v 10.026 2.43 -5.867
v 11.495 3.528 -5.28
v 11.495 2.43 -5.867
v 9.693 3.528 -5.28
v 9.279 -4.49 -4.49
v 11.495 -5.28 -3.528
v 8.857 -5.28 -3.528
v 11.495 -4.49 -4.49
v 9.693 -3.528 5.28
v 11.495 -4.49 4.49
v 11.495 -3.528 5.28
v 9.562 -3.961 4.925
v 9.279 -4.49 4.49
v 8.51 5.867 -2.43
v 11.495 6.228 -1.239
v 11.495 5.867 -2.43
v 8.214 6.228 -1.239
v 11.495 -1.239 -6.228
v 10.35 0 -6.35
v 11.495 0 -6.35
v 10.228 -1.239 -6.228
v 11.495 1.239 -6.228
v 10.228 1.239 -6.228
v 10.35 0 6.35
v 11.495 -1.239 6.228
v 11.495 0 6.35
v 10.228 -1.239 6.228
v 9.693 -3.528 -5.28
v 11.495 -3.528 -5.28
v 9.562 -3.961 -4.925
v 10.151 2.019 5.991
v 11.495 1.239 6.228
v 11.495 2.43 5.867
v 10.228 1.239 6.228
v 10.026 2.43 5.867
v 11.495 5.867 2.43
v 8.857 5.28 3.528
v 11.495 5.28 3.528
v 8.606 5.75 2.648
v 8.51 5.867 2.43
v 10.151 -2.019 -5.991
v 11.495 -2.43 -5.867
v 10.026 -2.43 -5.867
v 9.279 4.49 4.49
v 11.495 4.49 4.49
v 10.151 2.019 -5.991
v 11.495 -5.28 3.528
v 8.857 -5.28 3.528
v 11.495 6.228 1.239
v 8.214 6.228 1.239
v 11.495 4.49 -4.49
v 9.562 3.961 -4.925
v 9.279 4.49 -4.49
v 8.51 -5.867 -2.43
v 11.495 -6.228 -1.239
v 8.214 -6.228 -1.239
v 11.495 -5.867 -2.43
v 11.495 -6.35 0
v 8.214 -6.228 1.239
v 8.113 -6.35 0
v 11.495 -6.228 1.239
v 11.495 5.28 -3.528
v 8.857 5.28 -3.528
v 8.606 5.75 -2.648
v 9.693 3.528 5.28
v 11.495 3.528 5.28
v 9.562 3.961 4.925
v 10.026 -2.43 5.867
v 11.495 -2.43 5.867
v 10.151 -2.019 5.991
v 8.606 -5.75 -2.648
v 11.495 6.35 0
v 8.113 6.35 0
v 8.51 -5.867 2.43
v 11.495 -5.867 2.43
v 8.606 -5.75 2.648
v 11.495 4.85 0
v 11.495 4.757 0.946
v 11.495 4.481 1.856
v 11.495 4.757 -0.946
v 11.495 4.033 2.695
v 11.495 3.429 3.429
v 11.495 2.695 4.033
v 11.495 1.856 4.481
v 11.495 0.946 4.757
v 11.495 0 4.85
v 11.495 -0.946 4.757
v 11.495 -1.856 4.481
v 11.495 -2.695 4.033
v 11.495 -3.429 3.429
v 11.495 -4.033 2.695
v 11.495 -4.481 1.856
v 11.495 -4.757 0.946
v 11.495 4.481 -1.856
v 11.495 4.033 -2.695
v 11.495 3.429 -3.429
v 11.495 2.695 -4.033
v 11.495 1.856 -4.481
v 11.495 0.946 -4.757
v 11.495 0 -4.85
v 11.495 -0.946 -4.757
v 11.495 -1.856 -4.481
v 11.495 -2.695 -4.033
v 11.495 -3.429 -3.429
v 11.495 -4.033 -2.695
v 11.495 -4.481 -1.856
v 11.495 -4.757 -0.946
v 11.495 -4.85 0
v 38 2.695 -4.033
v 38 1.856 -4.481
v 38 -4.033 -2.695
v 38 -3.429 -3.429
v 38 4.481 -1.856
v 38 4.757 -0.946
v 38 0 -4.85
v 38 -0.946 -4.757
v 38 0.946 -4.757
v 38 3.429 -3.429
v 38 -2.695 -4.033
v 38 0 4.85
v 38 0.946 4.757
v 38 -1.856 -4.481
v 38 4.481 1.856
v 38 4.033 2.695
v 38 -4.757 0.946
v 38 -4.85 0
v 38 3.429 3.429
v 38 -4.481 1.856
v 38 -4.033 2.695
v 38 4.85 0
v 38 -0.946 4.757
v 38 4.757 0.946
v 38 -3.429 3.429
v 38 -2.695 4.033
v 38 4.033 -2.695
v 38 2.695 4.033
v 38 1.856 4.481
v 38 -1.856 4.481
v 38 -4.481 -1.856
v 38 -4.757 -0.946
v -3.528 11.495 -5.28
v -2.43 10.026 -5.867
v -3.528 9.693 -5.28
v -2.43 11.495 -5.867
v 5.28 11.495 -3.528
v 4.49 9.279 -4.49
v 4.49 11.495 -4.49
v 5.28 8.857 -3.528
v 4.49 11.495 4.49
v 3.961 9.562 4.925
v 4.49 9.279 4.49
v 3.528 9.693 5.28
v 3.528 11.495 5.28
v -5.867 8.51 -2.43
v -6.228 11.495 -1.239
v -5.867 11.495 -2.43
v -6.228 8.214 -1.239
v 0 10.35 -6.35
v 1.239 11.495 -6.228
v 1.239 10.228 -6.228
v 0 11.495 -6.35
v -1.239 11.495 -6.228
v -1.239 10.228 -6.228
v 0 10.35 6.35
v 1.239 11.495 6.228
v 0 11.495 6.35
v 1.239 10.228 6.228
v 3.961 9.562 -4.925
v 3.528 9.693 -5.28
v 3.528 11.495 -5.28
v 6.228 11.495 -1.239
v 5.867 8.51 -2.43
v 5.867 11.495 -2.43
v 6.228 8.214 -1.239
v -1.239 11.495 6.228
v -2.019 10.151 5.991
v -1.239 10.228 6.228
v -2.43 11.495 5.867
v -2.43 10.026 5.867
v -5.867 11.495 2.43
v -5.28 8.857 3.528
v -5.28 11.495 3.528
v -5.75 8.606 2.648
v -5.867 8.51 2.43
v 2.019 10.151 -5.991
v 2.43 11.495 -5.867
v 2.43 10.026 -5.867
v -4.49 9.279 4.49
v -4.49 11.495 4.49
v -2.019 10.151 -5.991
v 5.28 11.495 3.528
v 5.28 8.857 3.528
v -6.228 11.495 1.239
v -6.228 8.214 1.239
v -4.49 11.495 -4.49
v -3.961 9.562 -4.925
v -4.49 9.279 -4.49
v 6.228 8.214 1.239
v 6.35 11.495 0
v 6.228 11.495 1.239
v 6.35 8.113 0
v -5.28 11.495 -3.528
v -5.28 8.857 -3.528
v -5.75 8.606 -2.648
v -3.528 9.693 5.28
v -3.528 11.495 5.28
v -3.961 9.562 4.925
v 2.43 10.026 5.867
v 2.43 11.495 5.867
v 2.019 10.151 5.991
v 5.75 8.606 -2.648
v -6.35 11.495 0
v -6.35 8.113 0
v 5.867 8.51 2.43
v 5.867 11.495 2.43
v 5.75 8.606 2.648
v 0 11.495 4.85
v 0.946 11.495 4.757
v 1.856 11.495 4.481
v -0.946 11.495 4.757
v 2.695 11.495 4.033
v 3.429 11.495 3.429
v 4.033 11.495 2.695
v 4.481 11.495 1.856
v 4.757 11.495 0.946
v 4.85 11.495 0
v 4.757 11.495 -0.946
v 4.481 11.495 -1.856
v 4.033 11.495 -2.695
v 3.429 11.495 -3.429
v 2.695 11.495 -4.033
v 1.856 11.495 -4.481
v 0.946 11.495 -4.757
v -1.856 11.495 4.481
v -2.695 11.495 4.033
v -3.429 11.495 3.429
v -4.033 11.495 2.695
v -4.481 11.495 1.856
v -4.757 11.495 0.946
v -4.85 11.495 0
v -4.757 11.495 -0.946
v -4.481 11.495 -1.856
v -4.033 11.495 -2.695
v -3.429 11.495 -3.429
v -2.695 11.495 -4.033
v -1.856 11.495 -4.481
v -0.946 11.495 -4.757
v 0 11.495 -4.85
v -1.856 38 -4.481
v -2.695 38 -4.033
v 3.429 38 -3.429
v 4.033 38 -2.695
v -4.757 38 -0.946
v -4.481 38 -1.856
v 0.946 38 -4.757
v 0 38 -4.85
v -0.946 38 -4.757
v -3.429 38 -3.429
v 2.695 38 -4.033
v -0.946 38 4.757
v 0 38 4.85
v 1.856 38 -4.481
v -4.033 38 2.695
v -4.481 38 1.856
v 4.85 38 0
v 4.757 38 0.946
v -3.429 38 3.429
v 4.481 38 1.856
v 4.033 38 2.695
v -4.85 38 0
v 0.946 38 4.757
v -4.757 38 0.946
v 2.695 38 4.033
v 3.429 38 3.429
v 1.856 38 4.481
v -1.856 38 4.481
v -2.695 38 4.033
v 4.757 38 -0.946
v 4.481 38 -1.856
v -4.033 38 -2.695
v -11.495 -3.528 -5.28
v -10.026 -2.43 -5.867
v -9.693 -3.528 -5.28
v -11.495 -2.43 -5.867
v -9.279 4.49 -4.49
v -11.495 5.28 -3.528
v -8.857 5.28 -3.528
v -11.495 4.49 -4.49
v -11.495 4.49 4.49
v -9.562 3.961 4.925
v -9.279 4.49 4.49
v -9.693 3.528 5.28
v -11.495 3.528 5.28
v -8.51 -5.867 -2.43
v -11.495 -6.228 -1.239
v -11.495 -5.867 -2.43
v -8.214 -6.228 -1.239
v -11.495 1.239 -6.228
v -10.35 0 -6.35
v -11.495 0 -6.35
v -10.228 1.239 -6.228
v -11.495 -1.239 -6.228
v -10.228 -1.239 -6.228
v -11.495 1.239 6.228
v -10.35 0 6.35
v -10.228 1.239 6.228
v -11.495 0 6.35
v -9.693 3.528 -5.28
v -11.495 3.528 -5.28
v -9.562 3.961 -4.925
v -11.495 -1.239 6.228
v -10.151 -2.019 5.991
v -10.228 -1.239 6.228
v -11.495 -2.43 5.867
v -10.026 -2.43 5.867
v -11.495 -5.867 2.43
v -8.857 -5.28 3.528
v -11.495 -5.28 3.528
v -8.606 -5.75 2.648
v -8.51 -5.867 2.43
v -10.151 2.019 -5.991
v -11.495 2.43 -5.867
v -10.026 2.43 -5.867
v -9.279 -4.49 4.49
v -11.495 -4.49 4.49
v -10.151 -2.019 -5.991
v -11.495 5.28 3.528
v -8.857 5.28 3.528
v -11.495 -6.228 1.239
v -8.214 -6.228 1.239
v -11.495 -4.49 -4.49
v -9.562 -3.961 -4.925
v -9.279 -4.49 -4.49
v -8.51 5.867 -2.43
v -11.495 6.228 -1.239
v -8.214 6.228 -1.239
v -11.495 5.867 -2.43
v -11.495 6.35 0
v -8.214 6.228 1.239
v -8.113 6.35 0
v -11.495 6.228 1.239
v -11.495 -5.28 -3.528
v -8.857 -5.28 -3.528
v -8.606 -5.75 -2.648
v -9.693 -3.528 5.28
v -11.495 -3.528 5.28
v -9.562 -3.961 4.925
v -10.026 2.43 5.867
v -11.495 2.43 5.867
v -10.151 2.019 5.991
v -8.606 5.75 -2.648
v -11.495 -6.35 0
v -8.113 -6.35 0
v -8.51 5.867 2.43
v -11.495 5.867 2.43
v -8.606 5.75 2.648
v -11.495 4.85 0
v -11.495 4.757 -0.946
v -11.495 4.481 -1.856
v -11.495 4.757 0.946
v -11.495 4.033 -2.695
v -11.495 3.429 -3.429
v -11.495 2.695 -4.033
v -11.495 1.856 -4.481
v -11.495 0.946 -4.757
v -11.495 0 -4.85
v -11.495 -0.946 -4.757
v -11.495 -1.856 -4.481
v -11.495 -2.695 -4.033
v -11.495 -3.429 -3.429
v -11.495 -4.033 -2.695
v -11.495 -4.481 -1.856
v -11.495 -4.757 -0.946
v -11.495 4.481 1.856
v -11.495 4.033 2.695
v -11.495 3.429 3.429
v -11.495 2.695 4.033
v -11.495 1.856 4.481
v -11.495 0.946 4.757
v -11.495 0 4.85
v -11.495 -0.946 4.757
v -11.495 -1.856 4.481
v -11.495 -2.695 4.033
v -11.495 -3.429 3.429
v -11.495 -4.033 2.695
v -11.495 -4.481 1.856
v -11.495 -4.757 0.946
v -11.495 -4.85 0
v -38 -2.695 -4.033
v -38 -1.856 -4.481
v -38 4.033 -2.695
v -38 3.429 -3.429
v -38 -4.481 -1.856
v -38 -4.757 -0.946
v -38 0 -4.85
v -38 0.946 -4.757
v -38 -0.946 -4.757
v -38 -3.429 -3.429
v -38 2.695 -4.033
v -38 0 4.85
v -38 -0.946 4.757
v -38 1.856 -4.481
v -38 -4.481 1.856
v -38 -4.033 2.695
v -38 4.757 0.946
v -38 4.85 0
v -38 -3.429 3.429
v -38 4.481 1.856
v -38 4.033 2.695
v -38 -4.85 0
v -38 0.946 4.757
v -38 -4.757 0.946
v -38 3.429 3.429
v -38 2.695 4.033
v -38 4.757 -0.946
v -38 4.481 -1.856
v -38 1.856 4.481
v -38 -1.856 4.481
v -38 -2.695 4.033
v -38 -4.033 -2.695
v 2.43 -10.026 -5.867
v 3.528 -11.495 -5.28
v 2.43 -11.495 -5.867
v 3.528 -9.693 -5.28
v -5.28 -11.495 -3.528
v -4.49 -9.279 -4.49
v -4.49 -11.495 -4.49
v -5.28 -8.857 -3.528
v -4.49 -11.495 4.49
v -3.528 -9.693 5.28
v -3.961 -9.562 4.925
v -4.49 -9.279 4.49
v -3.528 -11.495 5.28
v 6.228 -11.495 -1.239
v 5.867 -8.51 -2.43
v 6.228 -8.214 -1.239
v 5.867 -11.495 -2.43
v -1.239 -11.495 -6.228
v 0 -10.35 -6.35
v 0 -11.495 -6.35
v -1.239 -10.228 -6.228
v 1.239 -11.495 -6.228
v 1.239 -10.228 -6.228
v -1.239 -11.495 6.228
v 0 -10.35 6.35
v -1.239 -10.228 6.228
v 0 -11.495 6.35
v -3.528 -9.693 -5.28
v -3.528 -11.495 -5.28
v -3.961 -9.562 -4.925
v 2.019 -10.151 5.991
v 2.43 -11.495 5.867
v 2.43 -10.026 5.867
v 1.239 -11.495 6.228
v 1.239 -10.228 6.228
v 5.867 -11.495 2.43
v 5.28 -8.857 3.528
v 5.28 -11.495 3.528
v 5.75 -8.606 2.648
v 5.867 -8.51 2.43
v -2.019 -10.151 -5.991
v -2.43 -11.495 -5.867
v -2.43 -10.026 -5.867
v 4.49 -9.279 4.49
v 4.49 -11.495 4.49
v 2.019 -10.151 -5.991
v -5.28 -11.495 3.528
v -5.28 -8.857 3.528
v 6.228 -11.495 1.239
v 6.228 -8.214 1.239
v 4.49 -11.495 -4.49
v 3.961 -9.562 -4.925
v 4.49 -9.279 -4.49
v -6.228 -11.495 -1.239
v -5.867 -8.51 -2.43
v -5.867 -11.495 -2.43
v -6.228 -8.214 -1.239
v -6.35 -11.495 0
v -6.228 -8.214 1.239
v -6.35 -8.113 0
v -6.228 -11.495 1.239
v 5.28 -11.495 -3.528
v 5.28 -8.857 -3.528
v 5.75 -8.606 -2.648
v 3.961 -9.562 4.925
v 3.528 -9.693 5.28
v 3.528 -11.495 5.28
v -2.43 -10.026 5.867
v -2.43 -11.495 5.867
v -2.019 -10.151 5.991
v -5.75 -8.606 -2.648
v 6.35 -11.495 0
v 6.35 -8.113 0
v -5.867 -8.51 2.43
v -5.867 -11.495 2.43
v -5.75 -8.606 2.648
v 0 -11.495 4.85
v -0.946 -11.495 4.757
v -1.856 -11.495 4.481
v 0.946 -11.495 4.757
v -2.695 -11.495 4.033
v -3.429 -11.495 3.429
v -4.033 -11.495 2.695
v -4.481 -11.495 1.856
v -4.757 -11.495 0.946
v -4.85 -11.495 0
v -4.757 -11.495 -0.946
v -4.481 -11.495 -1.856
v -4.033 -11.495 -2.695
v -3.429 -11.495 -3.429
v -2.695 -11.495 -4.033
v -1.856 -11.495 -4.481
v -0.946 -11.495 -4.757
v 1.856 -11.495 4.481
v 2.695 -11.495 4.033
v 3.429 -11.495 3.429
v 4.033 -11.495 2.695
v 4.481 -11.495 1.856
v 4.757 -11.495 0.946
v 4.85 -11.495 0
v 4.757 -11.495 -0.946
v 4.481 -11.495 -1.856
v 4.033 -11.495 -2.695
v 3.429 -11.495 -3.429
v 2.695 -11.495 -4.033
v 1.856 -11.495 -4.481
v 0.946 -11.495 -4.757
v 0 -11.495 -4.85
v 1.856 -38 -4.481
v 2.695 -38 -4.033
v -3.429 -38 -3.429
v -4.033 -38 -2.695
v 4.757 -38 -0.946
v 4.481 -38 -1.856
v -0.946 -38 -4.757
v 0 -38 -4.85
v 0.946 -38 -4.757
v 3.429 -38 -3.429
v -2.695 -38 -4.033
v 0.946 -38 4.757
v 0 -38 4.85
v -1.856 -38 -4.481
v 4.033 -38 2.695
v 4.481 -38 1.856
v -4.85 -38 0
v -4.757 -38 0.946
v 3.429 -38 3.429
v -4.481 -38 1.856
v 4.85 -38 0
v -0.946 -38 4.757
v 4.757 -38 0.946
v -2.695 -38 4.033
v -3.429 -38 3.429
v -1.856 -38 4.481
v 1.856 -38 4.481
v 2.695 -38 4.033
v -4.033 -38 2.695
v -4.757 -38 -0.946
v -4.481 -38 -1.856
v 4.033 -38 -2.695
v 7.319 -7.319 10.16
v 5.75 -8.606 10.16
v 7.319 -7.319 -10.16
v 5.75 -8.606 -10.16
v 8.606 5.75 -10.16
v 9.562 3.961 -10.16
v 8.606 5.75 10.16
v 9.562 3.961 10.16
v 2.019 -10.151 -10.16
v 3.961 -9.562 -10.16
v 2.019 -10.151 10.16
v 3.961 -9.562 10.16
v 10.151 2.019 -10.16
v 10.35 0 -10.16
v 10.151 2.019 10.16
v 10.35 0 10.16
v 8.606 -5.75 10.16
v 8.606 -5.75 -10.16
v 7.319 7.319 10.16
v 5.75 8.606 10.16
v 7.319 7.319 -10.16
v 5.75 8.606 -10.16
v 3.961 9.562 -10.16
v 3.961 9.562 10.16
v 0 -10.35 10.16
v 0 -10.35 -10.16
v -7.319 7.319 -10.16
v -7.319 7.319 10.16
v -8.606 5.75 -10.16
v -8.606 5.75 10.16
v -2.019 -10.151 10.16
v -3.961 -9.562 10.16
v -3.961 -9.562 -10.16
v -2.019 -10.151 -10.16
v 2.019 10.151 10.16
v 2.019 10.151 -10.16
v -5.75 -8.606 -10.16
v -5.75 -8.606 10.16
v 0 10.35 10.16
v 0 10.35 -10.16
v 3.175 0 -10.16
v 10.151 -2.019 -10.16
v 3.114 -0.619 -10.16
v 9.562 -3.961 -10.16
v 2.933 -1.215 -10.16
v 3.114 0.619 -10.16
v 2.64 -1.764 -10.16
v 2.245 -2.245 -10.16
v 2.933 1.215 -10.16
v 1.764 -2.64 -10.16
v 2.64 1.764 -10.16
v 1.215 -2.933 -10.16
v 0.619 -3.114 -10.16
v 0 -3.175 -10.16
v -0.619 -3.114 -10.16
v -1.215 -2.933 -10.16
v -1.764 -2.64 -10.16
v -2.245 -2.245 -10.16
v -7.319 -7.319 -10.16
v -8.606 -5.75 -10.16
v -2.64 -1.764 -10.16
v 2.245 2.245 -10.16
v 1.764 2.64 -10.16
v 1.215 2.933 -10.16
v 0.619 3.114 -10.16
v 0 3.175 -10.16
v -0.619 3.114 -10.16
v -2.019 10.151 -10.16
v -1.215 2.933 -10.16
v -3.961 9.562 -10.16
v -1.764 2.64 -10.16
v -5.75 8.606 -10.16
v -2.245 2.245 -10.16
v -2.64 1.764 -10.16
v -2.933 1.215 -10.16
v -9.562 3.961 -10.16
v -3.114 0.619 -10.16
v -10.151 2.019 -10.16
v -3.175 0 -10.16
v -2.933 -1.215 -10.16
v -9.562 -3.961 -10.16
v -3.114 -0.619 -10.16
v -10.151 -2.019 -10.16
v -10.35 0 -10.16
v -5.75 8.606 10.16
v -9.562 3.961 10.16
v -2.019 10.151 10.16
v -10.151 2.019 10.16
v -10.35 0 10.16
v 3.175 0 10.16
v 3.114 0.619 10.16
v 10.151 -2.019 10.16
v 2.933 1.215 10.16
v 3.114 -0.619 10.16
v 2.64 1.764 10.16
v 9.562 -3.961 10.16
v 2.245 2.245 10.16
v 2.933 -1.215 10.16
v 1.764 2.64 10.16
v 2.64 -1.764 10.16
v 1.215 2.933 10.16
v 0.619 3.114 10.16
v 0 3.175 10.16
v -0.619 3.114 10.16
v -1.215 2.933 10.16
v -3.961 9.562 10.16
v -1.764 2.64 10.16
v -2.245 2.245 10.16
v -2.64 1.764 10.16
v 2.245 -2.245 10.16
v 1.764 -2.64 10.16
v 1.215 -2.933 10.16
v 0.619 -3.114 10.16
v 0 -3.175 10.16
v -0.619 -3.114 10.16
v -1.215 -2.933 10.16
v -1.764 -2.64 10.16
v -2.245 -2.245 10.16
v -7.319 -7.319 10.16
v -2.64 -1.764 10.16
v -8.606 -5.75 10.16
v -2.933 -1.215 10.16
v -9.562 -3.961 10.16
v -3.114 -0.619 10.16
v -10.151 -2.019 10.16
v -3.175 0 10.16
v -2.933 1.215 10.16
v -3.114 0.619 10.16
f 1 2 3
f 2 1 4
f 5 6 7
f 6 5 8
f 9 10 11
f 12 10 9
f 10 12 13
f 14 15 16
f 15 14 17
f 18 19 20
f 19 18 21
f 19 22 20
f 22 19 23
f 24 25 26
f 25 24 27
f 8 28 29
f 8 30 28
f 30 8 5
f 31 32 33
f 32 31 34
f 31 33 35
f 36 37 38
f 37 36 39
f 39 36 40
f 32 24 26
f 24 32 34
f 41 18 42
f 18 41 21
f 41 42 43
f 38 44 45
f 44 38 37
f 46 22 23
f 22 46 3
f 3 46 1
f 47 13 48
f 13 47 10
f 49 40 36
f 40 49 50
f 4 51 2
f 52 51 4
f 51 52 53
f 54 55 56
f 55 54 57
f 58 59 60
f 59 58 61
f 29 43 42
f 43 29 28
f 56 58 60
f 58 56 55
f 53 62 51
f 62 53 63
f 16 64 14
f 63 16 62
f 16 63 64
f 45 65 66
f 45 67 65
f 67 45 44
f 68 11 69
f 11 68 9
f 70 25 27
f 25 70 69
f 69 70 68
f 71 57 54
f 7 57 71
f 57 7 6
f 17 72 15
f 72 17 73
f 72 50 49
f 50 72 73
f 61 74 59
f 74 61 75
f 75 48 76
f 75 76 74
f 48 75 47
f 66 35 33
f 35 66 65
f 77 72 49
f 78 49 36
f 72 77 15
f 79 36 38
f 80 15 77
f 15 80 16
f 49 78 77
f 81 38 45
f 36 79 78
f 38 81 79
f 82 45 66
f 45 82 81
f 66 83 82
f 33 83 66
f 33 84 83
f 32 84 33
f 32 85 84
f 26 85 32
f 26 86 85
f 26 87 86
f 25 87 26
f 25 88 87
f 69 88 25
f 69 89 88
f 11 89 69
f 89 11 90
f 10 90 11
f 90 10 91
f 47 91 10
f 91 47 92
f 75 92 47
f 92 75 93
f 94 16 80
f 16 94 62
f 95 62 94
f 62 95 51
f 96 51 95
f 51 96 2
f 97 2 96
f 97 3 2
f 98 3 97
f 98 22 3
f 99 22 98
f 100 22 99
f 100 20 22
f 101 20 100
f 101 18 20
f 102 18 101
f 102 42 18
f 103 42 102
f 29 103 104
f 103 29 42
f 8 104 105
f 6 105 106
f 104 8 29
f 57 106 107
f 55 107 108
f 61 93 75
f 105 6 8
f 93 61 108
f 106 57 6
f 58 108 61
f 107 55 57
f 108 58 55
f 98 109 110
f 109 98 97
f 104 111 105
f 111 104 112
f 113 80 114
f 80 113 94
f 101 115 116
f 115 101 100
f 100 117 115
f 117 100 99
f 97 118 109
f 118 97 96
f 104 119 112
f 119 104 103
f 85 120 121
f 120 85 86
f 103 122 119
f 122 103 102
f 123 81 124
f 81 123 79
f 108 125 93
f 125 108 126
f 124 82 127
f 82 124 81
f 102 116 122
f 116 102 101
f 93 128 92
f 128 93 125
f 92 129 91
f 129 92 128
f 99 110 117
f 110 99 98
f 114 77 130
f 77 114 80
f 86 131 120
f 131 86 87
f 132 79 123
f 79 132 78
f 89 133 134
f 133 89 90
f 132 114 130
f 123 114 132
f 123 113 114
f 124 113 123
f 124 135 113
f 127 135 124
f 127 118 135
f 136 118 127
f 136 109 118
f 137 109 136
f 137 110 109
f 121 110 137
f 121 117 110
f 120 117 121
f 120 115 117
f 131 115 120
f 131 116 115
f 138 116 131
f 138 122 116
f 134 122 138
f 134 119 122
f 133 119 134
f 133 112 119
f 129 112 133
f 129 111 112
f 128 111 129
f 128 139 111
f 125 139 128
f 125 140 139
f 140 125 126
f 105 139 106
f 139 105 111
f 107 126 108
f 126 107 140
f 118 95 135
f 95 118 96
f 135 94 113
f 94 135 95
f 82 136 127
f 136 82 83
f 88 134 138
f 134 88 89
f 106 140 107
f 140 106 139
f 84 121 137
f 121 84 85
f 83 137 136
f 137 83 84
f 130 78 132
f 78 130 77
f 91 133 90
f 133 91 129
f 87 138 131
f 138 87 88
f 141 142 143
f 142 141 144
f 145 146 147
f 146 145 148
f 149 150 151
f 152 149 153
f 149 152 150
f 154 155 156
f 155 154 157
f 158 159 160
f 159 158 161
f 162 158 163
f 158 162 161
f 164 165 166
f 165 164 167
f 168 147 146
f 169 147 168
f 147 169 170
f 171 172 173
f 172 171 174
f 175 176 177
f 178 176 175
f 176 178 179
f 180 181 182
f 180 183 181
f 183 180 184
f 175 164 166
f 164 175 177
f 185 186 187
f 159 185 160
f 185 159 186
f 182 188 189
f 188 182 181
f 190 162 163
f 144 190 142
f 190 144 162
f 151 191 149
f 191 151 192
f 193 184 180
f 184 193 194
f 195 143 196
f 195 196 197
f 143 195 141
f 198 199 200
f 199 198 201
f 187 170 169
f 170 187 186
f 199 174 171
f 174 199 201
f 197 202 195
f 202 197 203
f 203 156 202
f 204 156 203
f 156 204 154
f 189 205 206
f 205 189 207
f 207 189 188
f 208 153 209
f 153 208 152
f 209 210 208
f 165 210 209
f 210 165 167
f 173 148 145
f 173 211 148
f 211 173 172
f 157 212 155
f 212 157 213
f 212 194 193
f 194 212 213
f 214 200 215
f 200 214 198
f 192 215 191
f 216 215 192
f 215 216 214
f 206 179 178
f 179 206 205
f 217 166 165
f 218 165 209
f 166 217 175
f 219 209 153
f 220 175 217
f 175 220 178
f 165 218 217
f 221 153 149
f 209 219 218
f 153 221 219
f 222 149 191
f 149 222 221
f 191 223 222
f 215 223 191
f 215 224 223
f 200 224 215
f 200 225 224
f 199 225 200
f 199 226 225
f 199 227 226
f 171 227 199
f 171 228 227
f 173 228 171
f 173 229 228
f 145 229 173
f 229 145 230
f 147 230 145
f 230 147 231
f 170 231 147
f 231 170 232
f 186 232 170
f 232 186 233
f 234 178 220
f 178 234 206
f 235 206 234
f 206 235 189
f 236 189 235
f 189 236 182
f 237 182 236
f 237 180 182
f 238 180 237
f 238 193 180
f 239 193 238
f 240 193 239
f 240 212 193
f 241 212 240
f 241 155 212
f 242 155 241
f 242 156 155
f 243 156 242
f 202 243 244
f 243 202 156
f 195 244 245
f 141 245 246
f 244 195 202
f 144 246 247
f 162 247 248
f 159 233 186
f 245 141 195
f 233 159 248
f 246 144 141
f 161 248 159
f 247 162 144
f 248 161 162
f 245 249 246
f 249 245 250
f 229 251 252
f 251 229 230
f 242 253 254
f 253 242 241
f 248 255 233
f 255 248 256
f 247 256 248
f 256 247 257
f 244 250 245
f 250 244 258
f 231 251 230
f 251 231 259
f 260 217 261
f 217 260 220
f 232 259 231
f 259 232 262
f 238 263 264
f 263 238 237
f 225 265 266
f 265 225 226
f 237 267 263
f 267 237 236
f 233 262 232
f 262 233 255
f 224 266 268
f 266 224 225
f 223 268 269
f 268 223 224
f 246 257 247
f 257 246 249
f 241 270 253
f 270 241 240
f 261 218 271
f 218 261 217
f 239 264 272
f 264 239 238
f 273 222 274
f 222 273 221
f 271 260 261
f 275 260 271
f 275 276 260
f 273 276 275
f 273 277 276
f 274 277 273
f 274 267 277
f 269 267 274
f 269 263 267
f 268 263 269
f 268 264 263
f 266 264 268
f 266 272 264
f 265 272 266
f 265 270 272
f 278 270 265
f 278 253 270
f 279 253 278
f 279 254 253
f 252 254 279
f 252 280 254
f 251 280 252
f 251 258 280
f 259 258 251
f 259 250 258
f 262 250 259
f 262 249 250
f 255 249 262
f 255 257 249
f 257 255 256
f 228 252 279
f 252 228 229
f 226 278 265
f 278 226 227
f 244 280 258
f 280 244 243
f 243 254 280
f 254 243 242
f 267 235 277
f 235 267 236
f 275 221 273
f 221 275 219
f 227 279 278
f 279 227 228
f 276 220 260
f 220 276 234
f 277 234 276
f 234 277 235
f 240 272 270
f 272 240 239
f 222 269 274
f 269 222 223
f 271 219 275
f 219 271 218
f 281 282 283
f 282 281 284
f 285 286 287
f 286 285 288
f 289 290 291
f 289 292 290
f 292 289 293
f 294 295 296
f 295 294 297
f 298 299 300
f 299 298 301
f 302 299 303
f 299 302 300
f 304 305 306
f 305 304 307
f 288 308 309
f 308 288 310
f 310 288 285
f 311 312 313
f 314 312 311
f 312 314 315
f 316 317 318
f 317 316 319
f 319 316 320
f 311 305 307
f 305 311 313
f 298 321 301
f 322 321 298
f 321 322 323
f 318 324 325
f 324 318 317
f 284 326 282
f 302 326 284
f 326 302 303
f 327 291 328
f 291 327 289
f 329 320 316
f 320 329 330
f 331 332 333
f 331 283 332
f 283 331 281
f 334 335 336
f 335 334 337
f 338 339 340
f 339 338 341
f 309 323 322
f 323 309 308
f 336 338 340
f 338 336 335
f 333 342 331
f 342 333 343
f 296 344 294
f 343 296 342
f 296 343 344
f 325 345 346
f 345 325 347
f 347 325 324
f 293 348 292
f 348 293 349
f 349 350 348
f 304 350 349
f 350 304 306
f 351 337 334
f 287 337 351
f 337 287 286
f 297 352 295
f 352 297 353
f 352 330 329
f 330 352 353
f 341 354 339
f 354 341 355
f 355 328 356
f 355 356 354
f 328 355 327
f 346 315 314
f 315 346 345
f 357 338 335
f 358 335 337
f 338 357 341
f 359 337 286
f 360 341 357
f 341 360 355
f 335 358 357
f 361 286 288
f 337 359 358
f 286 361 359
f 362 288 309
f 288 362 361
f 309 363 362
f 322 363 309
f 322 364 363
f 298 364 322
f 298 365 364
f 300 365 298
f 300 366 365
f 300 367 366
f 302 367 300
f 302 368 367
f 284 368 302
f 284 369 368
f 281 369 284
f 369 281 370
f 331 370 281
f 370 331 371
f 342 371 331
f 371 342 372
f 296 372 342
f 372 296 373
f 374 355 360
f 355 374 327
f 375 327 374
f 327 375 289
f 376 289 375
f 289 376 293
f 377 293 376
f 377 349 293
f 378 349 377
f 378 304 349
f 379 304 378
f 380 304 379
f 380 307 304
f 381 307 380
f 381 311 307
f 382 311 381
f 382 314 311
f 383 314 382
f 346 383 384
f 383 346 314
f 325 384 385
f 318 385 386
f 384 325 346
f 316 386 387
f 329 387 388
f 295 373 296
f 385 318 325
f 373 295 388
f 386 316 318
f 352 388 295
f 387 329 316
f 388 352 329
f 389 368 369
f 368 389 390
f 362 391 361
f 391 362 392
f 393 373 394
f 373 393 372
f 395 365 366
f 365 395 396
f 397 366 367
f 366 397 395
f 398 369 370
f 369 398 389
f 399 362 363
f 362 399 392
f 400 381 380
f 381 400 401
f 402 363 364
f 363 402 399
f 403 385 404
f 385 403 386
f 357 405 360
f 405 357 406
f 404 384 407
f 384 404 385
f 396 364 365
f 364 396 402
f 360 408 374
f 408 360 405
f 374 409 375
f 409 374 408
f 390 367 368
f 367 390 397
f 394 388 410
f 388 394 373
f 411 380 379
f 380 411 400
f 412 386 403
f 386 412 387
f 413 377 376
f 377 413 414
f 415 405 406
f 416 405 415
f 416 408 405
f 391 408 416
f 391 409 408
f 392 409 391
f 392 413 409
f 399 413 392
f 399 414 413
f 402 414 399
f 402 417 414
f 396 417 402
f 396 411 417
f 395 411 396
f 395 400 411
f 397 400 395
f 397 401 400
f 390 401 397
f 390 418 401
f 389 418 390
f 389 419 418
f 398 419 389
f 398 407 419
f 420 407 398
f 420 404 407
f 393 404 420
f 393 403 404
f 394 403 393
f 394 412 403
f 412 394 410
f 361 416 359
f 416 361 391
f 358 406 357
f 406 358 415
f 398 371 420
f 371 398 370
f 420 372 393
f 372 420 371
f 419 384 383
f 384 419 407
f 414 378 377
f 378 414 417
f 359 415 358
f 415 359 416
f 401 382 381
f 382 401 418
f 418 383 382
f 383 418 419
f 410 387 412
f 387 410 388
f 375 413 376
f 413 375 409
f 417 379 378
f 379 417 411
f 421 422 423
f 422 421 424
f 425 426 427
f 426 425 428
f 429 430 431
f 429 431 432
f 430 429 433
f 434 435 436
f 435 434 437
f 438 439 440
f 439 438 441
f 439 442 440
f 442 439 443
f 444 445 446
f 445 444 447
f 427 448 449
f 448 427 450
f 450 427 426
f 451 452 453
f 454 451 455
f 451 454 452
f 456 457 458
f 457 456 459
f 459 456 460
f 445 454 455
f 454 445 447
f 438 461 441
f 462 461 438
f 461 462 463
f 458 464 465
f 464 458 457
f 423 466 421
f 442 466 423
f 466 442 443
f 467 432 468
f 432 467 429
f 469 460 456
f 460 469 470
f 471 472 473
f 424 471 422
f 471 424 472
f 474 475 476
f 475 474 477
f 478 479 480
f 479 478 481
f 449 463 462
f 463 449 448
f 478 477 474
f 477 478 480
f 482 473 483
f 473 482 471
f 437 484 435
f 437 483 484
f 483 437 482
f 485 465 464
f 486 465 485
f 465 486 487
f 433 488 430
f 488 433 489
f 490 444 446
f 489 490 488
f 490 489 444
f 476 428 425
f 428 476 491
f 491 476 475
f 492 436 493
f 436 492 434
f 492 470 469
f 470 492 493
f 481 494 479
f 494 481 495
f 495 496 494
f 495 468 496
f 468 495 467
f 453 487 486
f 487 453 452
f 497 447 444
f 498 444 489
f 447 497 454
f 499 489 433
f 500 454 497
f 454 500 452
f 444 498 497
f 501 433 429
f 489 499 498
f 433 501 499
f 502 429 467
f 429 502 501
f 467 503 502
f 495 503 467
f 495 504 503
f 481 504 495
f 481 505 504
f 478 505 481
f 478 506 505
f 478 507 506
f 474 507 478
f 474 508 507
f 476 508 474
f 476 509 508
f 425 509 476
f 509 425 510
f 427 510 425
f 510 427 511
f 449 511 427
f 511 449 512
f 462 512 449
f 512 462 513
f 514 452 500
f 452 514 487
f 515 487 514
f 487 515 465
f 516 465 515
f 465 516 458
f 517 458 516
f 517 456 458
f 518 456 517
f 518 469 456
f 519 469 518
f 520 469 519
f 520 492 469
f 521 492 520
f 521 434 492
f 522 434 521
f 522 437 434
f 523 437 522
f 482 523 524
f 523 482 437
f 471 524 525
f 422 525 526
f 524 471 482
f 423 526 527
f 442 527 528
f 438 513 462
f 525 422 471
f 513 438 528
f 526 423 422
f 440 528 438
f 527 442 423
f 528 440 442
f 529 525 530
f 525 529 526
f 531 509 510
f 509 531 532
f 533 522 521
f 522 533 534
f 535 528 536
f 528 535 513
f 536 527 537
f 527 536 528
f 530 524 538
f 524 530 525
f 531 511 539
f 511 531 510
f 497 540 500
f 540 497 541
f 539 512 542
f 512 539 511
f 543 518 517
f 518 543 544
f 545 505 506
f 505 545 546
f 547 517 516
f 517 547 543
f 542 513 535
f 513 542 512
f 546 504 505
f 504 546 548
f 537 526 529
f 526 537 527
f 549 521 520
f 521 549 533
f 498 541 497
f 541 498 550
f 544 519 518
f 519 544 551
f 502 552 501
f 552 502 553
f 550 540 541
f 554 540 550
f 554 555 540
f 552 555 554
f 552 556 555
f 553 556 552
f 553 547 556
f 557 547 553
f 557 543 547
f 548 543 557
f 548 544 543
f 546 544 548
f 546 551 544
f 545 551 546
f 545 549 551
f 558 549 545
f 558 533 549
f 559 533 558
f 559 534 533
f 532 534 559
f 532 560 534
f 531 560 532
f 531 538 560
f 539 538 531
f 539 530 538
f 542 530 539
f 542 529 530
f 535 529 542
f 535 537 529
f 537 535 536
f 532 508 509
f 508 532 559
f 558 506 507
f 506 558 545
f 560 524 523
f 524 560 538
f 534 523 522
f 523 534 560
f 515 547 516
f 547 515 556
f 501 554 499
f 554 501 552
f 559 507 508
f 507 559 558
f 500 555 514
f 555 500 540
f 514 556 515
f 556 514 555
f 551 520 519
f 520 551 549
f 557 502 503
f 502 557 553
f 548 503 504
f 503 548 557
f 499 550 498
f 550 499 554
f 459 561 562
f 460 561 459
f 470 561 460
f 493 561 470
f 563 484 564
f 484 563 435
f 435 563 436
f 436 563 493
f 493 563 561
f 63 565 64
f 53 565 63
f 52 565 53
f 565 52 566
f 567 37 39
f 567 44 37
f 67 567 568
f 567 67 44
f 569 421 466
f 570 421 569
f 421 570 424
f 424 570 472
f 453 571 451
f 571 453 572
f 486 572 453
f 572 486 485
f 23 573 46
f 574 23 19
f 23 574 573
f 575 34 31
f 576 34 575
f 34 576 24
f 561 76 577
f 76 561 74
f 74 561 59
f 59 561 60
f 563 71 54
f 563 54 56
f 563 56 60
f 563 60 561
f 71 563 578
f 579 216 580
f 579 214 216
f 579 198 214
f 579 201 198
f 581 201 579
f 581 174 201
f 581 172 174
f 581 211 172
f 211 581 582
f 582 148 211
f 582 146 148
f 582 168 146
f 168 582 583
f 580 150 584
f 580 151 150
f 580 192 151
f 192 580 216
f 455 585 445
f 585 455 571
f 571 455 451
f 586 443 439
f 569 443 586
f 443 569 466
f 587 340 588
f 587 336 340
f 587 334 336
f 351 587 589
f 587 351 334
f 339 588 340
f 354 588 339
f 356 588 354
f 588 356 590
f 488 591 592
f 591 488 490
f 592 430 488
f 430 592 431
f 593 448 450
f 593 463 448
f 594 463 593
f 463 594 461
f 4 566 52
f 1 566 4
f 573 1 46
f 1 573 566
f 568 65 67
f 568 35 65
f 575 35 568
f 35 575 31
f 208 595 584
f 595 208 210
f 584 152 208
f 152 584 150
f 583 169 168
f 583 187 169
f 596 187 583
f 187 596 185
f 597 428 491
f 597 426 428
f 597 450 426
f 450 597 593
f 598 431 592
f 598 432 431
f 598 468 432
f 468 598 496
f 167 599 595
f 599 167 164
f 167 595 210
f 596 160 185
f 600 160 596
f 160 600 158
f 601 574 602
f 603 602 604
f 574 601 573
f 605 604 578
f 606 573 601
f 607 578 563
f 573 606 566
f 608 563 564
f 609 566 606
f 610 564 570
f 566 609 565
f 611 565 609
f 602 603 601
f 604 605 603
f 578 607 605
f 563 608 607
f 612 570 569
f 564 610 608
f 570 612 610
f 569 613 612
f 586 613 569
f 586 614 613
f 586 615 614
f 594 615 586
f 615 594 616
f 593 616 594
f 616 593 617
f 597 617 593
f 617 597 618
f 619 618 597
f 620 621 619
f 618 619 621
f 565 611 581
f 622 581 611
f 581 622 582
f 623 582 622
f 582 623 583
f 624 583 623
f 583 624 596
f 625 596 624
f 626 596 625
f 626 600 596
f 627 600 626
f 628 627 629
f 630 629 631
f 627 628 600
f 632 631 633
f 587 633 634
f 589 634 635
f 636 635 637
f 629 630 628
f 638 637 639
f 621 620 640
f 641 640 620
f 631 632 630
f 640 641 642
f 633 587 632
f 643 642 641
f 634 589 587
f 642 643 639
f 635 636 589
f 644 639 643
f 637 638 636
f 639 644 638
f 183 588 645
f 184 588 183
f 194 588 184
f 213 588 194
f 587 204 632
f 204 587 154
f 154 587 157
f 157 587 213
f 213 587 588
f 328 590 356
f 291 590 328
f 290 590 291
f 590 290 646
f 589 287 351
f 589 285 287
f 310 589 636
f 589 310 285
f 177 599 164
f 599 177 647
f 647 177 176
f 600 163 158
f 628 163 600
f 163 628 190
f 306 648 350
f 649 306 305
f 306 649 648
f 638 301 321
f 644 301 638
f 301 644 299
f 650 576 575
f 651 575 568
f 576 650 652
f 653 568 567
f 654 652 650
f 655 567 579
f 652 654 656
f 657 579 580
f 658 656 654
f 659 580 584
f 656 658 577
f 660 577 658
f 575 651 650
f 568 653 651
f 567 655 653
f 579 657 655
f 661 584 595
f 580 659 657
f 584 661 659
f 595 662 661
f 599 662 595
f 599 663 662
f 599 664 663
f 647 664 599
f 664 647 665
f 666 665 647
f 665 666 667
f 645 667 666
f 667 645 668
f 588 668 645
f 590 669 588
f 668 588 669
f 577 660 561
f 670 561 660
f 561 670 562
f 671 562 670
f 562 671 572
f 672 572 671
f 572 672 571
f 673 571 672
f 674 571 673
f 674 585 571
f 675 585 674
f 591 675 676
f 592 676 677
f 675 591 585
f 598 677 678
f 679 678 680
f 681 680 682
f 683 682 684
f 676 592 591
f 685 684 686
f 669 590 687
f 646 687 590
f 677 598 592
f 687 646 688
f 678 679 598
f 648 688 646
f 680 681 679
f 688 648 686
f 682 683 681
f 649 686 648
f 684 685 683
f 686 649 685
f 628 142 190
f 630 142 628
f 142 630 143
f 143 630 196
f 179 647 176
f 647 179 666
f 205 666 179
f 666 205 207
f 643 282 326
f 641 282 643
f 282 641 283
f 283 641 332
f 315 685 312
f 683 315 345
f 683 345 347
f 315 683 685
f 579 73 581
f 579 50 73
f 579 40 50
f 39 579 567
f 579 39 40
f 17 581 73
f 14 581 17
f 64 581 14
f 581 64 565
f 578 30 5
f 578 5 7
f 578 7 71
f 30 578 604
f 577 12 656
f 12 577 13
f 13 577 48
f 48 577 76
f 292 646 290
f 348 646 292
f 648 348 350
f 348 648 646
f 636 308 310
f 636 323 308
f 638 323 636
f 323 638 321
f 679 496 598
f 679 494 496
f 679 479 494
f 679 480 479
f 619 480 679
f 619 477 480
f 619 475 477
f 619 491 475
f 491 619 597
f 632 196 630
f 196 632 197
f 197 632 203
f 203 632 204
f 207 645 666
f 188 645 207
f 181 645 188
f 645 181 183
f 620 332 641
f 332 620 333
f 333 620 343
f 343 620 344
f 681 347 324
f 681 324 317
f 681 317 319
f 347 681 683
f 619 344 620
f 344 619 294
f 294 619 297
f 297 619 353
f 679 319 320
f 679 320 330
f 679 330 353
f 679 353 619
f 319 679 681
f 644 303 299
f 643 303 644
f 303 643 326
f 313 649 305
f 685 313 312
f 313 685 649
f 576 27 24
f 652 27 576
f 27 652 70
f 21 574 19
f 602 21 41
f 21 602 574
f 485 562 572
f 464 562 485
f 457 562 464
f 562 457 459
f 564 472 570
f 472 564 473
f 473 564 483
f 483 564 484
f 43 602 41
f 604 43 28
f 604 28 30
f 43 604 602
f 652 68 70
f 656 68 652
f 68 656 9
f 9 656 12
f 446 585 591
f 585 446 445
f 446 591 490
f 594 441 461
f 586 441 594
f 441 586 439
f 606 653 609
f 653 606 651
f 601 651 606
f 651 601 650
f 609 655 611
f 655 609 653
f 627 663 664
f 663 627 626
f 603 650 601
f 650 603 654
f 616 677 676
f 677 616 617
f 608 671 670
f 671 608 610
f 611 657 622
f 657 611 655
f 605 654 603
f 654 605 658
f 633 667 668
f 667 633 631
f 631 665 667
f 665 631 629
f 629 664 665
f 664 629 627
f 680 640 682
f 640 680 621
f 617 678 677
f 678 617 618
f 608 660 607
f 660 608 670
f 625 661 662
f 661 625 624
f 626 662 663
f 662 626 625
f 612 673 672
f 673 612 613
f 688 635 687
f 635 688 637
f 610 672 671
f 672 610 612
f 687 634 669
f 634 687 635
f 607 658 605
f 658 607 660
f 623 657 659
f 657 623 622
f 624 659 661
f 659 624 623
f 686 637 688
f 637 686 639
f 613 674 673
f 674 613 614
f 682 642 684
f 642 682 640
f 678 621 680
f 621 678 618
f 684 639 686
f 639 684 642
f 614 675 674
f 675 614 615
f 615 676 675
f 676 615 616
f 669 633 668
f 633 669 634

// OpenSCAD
$fn = 32;

// ----------------------------------------------------------------------
// Cardan cross: 76 mm span, 12.7 mm trunnions
// ----------------------------------------------------------------------

// --- parameters (mm) ---
journal_d = 12.7;         // trunnion diameter
arm_len = 38;             // trunnion length from the centre
step_r = 4.32;            // step position from the centre
step_d = 9.7;             // journal diameter after the step
hub_d = 20.7;             // hub diameter
hub_h = 20.32;            // hub height
bore_d = 6.35;            // hub bore

difference() {
  union() {
    /* hub along the joint axis */
    cylinder(h = hub_h, d = hub_d, center = true);
    for (a = [0 : 90 : 270]) rotate([0, 0, a]) {
      /* trunnion, sunk into the hub */
      translate([hub_d / 4, 0, 0]) rotate([0, 90, 0]) cylinder(h = step_r + 2, d = journal_d);
      /* stepped journal out to the tip */
      translate([step_r - 0.5, 0, 0]) rotate([0, 90, 0]) cylinder(h = arm_len + 0.5 - step_r, d = step_d);
    }
  }
  /* lubrication bore through the hub, 2.5 mm clear on both sides */
  translate([0, 0, -hub_h / 2 - 2.5]) cylinder(h = hub_h + 5, d = bore_d);
}
